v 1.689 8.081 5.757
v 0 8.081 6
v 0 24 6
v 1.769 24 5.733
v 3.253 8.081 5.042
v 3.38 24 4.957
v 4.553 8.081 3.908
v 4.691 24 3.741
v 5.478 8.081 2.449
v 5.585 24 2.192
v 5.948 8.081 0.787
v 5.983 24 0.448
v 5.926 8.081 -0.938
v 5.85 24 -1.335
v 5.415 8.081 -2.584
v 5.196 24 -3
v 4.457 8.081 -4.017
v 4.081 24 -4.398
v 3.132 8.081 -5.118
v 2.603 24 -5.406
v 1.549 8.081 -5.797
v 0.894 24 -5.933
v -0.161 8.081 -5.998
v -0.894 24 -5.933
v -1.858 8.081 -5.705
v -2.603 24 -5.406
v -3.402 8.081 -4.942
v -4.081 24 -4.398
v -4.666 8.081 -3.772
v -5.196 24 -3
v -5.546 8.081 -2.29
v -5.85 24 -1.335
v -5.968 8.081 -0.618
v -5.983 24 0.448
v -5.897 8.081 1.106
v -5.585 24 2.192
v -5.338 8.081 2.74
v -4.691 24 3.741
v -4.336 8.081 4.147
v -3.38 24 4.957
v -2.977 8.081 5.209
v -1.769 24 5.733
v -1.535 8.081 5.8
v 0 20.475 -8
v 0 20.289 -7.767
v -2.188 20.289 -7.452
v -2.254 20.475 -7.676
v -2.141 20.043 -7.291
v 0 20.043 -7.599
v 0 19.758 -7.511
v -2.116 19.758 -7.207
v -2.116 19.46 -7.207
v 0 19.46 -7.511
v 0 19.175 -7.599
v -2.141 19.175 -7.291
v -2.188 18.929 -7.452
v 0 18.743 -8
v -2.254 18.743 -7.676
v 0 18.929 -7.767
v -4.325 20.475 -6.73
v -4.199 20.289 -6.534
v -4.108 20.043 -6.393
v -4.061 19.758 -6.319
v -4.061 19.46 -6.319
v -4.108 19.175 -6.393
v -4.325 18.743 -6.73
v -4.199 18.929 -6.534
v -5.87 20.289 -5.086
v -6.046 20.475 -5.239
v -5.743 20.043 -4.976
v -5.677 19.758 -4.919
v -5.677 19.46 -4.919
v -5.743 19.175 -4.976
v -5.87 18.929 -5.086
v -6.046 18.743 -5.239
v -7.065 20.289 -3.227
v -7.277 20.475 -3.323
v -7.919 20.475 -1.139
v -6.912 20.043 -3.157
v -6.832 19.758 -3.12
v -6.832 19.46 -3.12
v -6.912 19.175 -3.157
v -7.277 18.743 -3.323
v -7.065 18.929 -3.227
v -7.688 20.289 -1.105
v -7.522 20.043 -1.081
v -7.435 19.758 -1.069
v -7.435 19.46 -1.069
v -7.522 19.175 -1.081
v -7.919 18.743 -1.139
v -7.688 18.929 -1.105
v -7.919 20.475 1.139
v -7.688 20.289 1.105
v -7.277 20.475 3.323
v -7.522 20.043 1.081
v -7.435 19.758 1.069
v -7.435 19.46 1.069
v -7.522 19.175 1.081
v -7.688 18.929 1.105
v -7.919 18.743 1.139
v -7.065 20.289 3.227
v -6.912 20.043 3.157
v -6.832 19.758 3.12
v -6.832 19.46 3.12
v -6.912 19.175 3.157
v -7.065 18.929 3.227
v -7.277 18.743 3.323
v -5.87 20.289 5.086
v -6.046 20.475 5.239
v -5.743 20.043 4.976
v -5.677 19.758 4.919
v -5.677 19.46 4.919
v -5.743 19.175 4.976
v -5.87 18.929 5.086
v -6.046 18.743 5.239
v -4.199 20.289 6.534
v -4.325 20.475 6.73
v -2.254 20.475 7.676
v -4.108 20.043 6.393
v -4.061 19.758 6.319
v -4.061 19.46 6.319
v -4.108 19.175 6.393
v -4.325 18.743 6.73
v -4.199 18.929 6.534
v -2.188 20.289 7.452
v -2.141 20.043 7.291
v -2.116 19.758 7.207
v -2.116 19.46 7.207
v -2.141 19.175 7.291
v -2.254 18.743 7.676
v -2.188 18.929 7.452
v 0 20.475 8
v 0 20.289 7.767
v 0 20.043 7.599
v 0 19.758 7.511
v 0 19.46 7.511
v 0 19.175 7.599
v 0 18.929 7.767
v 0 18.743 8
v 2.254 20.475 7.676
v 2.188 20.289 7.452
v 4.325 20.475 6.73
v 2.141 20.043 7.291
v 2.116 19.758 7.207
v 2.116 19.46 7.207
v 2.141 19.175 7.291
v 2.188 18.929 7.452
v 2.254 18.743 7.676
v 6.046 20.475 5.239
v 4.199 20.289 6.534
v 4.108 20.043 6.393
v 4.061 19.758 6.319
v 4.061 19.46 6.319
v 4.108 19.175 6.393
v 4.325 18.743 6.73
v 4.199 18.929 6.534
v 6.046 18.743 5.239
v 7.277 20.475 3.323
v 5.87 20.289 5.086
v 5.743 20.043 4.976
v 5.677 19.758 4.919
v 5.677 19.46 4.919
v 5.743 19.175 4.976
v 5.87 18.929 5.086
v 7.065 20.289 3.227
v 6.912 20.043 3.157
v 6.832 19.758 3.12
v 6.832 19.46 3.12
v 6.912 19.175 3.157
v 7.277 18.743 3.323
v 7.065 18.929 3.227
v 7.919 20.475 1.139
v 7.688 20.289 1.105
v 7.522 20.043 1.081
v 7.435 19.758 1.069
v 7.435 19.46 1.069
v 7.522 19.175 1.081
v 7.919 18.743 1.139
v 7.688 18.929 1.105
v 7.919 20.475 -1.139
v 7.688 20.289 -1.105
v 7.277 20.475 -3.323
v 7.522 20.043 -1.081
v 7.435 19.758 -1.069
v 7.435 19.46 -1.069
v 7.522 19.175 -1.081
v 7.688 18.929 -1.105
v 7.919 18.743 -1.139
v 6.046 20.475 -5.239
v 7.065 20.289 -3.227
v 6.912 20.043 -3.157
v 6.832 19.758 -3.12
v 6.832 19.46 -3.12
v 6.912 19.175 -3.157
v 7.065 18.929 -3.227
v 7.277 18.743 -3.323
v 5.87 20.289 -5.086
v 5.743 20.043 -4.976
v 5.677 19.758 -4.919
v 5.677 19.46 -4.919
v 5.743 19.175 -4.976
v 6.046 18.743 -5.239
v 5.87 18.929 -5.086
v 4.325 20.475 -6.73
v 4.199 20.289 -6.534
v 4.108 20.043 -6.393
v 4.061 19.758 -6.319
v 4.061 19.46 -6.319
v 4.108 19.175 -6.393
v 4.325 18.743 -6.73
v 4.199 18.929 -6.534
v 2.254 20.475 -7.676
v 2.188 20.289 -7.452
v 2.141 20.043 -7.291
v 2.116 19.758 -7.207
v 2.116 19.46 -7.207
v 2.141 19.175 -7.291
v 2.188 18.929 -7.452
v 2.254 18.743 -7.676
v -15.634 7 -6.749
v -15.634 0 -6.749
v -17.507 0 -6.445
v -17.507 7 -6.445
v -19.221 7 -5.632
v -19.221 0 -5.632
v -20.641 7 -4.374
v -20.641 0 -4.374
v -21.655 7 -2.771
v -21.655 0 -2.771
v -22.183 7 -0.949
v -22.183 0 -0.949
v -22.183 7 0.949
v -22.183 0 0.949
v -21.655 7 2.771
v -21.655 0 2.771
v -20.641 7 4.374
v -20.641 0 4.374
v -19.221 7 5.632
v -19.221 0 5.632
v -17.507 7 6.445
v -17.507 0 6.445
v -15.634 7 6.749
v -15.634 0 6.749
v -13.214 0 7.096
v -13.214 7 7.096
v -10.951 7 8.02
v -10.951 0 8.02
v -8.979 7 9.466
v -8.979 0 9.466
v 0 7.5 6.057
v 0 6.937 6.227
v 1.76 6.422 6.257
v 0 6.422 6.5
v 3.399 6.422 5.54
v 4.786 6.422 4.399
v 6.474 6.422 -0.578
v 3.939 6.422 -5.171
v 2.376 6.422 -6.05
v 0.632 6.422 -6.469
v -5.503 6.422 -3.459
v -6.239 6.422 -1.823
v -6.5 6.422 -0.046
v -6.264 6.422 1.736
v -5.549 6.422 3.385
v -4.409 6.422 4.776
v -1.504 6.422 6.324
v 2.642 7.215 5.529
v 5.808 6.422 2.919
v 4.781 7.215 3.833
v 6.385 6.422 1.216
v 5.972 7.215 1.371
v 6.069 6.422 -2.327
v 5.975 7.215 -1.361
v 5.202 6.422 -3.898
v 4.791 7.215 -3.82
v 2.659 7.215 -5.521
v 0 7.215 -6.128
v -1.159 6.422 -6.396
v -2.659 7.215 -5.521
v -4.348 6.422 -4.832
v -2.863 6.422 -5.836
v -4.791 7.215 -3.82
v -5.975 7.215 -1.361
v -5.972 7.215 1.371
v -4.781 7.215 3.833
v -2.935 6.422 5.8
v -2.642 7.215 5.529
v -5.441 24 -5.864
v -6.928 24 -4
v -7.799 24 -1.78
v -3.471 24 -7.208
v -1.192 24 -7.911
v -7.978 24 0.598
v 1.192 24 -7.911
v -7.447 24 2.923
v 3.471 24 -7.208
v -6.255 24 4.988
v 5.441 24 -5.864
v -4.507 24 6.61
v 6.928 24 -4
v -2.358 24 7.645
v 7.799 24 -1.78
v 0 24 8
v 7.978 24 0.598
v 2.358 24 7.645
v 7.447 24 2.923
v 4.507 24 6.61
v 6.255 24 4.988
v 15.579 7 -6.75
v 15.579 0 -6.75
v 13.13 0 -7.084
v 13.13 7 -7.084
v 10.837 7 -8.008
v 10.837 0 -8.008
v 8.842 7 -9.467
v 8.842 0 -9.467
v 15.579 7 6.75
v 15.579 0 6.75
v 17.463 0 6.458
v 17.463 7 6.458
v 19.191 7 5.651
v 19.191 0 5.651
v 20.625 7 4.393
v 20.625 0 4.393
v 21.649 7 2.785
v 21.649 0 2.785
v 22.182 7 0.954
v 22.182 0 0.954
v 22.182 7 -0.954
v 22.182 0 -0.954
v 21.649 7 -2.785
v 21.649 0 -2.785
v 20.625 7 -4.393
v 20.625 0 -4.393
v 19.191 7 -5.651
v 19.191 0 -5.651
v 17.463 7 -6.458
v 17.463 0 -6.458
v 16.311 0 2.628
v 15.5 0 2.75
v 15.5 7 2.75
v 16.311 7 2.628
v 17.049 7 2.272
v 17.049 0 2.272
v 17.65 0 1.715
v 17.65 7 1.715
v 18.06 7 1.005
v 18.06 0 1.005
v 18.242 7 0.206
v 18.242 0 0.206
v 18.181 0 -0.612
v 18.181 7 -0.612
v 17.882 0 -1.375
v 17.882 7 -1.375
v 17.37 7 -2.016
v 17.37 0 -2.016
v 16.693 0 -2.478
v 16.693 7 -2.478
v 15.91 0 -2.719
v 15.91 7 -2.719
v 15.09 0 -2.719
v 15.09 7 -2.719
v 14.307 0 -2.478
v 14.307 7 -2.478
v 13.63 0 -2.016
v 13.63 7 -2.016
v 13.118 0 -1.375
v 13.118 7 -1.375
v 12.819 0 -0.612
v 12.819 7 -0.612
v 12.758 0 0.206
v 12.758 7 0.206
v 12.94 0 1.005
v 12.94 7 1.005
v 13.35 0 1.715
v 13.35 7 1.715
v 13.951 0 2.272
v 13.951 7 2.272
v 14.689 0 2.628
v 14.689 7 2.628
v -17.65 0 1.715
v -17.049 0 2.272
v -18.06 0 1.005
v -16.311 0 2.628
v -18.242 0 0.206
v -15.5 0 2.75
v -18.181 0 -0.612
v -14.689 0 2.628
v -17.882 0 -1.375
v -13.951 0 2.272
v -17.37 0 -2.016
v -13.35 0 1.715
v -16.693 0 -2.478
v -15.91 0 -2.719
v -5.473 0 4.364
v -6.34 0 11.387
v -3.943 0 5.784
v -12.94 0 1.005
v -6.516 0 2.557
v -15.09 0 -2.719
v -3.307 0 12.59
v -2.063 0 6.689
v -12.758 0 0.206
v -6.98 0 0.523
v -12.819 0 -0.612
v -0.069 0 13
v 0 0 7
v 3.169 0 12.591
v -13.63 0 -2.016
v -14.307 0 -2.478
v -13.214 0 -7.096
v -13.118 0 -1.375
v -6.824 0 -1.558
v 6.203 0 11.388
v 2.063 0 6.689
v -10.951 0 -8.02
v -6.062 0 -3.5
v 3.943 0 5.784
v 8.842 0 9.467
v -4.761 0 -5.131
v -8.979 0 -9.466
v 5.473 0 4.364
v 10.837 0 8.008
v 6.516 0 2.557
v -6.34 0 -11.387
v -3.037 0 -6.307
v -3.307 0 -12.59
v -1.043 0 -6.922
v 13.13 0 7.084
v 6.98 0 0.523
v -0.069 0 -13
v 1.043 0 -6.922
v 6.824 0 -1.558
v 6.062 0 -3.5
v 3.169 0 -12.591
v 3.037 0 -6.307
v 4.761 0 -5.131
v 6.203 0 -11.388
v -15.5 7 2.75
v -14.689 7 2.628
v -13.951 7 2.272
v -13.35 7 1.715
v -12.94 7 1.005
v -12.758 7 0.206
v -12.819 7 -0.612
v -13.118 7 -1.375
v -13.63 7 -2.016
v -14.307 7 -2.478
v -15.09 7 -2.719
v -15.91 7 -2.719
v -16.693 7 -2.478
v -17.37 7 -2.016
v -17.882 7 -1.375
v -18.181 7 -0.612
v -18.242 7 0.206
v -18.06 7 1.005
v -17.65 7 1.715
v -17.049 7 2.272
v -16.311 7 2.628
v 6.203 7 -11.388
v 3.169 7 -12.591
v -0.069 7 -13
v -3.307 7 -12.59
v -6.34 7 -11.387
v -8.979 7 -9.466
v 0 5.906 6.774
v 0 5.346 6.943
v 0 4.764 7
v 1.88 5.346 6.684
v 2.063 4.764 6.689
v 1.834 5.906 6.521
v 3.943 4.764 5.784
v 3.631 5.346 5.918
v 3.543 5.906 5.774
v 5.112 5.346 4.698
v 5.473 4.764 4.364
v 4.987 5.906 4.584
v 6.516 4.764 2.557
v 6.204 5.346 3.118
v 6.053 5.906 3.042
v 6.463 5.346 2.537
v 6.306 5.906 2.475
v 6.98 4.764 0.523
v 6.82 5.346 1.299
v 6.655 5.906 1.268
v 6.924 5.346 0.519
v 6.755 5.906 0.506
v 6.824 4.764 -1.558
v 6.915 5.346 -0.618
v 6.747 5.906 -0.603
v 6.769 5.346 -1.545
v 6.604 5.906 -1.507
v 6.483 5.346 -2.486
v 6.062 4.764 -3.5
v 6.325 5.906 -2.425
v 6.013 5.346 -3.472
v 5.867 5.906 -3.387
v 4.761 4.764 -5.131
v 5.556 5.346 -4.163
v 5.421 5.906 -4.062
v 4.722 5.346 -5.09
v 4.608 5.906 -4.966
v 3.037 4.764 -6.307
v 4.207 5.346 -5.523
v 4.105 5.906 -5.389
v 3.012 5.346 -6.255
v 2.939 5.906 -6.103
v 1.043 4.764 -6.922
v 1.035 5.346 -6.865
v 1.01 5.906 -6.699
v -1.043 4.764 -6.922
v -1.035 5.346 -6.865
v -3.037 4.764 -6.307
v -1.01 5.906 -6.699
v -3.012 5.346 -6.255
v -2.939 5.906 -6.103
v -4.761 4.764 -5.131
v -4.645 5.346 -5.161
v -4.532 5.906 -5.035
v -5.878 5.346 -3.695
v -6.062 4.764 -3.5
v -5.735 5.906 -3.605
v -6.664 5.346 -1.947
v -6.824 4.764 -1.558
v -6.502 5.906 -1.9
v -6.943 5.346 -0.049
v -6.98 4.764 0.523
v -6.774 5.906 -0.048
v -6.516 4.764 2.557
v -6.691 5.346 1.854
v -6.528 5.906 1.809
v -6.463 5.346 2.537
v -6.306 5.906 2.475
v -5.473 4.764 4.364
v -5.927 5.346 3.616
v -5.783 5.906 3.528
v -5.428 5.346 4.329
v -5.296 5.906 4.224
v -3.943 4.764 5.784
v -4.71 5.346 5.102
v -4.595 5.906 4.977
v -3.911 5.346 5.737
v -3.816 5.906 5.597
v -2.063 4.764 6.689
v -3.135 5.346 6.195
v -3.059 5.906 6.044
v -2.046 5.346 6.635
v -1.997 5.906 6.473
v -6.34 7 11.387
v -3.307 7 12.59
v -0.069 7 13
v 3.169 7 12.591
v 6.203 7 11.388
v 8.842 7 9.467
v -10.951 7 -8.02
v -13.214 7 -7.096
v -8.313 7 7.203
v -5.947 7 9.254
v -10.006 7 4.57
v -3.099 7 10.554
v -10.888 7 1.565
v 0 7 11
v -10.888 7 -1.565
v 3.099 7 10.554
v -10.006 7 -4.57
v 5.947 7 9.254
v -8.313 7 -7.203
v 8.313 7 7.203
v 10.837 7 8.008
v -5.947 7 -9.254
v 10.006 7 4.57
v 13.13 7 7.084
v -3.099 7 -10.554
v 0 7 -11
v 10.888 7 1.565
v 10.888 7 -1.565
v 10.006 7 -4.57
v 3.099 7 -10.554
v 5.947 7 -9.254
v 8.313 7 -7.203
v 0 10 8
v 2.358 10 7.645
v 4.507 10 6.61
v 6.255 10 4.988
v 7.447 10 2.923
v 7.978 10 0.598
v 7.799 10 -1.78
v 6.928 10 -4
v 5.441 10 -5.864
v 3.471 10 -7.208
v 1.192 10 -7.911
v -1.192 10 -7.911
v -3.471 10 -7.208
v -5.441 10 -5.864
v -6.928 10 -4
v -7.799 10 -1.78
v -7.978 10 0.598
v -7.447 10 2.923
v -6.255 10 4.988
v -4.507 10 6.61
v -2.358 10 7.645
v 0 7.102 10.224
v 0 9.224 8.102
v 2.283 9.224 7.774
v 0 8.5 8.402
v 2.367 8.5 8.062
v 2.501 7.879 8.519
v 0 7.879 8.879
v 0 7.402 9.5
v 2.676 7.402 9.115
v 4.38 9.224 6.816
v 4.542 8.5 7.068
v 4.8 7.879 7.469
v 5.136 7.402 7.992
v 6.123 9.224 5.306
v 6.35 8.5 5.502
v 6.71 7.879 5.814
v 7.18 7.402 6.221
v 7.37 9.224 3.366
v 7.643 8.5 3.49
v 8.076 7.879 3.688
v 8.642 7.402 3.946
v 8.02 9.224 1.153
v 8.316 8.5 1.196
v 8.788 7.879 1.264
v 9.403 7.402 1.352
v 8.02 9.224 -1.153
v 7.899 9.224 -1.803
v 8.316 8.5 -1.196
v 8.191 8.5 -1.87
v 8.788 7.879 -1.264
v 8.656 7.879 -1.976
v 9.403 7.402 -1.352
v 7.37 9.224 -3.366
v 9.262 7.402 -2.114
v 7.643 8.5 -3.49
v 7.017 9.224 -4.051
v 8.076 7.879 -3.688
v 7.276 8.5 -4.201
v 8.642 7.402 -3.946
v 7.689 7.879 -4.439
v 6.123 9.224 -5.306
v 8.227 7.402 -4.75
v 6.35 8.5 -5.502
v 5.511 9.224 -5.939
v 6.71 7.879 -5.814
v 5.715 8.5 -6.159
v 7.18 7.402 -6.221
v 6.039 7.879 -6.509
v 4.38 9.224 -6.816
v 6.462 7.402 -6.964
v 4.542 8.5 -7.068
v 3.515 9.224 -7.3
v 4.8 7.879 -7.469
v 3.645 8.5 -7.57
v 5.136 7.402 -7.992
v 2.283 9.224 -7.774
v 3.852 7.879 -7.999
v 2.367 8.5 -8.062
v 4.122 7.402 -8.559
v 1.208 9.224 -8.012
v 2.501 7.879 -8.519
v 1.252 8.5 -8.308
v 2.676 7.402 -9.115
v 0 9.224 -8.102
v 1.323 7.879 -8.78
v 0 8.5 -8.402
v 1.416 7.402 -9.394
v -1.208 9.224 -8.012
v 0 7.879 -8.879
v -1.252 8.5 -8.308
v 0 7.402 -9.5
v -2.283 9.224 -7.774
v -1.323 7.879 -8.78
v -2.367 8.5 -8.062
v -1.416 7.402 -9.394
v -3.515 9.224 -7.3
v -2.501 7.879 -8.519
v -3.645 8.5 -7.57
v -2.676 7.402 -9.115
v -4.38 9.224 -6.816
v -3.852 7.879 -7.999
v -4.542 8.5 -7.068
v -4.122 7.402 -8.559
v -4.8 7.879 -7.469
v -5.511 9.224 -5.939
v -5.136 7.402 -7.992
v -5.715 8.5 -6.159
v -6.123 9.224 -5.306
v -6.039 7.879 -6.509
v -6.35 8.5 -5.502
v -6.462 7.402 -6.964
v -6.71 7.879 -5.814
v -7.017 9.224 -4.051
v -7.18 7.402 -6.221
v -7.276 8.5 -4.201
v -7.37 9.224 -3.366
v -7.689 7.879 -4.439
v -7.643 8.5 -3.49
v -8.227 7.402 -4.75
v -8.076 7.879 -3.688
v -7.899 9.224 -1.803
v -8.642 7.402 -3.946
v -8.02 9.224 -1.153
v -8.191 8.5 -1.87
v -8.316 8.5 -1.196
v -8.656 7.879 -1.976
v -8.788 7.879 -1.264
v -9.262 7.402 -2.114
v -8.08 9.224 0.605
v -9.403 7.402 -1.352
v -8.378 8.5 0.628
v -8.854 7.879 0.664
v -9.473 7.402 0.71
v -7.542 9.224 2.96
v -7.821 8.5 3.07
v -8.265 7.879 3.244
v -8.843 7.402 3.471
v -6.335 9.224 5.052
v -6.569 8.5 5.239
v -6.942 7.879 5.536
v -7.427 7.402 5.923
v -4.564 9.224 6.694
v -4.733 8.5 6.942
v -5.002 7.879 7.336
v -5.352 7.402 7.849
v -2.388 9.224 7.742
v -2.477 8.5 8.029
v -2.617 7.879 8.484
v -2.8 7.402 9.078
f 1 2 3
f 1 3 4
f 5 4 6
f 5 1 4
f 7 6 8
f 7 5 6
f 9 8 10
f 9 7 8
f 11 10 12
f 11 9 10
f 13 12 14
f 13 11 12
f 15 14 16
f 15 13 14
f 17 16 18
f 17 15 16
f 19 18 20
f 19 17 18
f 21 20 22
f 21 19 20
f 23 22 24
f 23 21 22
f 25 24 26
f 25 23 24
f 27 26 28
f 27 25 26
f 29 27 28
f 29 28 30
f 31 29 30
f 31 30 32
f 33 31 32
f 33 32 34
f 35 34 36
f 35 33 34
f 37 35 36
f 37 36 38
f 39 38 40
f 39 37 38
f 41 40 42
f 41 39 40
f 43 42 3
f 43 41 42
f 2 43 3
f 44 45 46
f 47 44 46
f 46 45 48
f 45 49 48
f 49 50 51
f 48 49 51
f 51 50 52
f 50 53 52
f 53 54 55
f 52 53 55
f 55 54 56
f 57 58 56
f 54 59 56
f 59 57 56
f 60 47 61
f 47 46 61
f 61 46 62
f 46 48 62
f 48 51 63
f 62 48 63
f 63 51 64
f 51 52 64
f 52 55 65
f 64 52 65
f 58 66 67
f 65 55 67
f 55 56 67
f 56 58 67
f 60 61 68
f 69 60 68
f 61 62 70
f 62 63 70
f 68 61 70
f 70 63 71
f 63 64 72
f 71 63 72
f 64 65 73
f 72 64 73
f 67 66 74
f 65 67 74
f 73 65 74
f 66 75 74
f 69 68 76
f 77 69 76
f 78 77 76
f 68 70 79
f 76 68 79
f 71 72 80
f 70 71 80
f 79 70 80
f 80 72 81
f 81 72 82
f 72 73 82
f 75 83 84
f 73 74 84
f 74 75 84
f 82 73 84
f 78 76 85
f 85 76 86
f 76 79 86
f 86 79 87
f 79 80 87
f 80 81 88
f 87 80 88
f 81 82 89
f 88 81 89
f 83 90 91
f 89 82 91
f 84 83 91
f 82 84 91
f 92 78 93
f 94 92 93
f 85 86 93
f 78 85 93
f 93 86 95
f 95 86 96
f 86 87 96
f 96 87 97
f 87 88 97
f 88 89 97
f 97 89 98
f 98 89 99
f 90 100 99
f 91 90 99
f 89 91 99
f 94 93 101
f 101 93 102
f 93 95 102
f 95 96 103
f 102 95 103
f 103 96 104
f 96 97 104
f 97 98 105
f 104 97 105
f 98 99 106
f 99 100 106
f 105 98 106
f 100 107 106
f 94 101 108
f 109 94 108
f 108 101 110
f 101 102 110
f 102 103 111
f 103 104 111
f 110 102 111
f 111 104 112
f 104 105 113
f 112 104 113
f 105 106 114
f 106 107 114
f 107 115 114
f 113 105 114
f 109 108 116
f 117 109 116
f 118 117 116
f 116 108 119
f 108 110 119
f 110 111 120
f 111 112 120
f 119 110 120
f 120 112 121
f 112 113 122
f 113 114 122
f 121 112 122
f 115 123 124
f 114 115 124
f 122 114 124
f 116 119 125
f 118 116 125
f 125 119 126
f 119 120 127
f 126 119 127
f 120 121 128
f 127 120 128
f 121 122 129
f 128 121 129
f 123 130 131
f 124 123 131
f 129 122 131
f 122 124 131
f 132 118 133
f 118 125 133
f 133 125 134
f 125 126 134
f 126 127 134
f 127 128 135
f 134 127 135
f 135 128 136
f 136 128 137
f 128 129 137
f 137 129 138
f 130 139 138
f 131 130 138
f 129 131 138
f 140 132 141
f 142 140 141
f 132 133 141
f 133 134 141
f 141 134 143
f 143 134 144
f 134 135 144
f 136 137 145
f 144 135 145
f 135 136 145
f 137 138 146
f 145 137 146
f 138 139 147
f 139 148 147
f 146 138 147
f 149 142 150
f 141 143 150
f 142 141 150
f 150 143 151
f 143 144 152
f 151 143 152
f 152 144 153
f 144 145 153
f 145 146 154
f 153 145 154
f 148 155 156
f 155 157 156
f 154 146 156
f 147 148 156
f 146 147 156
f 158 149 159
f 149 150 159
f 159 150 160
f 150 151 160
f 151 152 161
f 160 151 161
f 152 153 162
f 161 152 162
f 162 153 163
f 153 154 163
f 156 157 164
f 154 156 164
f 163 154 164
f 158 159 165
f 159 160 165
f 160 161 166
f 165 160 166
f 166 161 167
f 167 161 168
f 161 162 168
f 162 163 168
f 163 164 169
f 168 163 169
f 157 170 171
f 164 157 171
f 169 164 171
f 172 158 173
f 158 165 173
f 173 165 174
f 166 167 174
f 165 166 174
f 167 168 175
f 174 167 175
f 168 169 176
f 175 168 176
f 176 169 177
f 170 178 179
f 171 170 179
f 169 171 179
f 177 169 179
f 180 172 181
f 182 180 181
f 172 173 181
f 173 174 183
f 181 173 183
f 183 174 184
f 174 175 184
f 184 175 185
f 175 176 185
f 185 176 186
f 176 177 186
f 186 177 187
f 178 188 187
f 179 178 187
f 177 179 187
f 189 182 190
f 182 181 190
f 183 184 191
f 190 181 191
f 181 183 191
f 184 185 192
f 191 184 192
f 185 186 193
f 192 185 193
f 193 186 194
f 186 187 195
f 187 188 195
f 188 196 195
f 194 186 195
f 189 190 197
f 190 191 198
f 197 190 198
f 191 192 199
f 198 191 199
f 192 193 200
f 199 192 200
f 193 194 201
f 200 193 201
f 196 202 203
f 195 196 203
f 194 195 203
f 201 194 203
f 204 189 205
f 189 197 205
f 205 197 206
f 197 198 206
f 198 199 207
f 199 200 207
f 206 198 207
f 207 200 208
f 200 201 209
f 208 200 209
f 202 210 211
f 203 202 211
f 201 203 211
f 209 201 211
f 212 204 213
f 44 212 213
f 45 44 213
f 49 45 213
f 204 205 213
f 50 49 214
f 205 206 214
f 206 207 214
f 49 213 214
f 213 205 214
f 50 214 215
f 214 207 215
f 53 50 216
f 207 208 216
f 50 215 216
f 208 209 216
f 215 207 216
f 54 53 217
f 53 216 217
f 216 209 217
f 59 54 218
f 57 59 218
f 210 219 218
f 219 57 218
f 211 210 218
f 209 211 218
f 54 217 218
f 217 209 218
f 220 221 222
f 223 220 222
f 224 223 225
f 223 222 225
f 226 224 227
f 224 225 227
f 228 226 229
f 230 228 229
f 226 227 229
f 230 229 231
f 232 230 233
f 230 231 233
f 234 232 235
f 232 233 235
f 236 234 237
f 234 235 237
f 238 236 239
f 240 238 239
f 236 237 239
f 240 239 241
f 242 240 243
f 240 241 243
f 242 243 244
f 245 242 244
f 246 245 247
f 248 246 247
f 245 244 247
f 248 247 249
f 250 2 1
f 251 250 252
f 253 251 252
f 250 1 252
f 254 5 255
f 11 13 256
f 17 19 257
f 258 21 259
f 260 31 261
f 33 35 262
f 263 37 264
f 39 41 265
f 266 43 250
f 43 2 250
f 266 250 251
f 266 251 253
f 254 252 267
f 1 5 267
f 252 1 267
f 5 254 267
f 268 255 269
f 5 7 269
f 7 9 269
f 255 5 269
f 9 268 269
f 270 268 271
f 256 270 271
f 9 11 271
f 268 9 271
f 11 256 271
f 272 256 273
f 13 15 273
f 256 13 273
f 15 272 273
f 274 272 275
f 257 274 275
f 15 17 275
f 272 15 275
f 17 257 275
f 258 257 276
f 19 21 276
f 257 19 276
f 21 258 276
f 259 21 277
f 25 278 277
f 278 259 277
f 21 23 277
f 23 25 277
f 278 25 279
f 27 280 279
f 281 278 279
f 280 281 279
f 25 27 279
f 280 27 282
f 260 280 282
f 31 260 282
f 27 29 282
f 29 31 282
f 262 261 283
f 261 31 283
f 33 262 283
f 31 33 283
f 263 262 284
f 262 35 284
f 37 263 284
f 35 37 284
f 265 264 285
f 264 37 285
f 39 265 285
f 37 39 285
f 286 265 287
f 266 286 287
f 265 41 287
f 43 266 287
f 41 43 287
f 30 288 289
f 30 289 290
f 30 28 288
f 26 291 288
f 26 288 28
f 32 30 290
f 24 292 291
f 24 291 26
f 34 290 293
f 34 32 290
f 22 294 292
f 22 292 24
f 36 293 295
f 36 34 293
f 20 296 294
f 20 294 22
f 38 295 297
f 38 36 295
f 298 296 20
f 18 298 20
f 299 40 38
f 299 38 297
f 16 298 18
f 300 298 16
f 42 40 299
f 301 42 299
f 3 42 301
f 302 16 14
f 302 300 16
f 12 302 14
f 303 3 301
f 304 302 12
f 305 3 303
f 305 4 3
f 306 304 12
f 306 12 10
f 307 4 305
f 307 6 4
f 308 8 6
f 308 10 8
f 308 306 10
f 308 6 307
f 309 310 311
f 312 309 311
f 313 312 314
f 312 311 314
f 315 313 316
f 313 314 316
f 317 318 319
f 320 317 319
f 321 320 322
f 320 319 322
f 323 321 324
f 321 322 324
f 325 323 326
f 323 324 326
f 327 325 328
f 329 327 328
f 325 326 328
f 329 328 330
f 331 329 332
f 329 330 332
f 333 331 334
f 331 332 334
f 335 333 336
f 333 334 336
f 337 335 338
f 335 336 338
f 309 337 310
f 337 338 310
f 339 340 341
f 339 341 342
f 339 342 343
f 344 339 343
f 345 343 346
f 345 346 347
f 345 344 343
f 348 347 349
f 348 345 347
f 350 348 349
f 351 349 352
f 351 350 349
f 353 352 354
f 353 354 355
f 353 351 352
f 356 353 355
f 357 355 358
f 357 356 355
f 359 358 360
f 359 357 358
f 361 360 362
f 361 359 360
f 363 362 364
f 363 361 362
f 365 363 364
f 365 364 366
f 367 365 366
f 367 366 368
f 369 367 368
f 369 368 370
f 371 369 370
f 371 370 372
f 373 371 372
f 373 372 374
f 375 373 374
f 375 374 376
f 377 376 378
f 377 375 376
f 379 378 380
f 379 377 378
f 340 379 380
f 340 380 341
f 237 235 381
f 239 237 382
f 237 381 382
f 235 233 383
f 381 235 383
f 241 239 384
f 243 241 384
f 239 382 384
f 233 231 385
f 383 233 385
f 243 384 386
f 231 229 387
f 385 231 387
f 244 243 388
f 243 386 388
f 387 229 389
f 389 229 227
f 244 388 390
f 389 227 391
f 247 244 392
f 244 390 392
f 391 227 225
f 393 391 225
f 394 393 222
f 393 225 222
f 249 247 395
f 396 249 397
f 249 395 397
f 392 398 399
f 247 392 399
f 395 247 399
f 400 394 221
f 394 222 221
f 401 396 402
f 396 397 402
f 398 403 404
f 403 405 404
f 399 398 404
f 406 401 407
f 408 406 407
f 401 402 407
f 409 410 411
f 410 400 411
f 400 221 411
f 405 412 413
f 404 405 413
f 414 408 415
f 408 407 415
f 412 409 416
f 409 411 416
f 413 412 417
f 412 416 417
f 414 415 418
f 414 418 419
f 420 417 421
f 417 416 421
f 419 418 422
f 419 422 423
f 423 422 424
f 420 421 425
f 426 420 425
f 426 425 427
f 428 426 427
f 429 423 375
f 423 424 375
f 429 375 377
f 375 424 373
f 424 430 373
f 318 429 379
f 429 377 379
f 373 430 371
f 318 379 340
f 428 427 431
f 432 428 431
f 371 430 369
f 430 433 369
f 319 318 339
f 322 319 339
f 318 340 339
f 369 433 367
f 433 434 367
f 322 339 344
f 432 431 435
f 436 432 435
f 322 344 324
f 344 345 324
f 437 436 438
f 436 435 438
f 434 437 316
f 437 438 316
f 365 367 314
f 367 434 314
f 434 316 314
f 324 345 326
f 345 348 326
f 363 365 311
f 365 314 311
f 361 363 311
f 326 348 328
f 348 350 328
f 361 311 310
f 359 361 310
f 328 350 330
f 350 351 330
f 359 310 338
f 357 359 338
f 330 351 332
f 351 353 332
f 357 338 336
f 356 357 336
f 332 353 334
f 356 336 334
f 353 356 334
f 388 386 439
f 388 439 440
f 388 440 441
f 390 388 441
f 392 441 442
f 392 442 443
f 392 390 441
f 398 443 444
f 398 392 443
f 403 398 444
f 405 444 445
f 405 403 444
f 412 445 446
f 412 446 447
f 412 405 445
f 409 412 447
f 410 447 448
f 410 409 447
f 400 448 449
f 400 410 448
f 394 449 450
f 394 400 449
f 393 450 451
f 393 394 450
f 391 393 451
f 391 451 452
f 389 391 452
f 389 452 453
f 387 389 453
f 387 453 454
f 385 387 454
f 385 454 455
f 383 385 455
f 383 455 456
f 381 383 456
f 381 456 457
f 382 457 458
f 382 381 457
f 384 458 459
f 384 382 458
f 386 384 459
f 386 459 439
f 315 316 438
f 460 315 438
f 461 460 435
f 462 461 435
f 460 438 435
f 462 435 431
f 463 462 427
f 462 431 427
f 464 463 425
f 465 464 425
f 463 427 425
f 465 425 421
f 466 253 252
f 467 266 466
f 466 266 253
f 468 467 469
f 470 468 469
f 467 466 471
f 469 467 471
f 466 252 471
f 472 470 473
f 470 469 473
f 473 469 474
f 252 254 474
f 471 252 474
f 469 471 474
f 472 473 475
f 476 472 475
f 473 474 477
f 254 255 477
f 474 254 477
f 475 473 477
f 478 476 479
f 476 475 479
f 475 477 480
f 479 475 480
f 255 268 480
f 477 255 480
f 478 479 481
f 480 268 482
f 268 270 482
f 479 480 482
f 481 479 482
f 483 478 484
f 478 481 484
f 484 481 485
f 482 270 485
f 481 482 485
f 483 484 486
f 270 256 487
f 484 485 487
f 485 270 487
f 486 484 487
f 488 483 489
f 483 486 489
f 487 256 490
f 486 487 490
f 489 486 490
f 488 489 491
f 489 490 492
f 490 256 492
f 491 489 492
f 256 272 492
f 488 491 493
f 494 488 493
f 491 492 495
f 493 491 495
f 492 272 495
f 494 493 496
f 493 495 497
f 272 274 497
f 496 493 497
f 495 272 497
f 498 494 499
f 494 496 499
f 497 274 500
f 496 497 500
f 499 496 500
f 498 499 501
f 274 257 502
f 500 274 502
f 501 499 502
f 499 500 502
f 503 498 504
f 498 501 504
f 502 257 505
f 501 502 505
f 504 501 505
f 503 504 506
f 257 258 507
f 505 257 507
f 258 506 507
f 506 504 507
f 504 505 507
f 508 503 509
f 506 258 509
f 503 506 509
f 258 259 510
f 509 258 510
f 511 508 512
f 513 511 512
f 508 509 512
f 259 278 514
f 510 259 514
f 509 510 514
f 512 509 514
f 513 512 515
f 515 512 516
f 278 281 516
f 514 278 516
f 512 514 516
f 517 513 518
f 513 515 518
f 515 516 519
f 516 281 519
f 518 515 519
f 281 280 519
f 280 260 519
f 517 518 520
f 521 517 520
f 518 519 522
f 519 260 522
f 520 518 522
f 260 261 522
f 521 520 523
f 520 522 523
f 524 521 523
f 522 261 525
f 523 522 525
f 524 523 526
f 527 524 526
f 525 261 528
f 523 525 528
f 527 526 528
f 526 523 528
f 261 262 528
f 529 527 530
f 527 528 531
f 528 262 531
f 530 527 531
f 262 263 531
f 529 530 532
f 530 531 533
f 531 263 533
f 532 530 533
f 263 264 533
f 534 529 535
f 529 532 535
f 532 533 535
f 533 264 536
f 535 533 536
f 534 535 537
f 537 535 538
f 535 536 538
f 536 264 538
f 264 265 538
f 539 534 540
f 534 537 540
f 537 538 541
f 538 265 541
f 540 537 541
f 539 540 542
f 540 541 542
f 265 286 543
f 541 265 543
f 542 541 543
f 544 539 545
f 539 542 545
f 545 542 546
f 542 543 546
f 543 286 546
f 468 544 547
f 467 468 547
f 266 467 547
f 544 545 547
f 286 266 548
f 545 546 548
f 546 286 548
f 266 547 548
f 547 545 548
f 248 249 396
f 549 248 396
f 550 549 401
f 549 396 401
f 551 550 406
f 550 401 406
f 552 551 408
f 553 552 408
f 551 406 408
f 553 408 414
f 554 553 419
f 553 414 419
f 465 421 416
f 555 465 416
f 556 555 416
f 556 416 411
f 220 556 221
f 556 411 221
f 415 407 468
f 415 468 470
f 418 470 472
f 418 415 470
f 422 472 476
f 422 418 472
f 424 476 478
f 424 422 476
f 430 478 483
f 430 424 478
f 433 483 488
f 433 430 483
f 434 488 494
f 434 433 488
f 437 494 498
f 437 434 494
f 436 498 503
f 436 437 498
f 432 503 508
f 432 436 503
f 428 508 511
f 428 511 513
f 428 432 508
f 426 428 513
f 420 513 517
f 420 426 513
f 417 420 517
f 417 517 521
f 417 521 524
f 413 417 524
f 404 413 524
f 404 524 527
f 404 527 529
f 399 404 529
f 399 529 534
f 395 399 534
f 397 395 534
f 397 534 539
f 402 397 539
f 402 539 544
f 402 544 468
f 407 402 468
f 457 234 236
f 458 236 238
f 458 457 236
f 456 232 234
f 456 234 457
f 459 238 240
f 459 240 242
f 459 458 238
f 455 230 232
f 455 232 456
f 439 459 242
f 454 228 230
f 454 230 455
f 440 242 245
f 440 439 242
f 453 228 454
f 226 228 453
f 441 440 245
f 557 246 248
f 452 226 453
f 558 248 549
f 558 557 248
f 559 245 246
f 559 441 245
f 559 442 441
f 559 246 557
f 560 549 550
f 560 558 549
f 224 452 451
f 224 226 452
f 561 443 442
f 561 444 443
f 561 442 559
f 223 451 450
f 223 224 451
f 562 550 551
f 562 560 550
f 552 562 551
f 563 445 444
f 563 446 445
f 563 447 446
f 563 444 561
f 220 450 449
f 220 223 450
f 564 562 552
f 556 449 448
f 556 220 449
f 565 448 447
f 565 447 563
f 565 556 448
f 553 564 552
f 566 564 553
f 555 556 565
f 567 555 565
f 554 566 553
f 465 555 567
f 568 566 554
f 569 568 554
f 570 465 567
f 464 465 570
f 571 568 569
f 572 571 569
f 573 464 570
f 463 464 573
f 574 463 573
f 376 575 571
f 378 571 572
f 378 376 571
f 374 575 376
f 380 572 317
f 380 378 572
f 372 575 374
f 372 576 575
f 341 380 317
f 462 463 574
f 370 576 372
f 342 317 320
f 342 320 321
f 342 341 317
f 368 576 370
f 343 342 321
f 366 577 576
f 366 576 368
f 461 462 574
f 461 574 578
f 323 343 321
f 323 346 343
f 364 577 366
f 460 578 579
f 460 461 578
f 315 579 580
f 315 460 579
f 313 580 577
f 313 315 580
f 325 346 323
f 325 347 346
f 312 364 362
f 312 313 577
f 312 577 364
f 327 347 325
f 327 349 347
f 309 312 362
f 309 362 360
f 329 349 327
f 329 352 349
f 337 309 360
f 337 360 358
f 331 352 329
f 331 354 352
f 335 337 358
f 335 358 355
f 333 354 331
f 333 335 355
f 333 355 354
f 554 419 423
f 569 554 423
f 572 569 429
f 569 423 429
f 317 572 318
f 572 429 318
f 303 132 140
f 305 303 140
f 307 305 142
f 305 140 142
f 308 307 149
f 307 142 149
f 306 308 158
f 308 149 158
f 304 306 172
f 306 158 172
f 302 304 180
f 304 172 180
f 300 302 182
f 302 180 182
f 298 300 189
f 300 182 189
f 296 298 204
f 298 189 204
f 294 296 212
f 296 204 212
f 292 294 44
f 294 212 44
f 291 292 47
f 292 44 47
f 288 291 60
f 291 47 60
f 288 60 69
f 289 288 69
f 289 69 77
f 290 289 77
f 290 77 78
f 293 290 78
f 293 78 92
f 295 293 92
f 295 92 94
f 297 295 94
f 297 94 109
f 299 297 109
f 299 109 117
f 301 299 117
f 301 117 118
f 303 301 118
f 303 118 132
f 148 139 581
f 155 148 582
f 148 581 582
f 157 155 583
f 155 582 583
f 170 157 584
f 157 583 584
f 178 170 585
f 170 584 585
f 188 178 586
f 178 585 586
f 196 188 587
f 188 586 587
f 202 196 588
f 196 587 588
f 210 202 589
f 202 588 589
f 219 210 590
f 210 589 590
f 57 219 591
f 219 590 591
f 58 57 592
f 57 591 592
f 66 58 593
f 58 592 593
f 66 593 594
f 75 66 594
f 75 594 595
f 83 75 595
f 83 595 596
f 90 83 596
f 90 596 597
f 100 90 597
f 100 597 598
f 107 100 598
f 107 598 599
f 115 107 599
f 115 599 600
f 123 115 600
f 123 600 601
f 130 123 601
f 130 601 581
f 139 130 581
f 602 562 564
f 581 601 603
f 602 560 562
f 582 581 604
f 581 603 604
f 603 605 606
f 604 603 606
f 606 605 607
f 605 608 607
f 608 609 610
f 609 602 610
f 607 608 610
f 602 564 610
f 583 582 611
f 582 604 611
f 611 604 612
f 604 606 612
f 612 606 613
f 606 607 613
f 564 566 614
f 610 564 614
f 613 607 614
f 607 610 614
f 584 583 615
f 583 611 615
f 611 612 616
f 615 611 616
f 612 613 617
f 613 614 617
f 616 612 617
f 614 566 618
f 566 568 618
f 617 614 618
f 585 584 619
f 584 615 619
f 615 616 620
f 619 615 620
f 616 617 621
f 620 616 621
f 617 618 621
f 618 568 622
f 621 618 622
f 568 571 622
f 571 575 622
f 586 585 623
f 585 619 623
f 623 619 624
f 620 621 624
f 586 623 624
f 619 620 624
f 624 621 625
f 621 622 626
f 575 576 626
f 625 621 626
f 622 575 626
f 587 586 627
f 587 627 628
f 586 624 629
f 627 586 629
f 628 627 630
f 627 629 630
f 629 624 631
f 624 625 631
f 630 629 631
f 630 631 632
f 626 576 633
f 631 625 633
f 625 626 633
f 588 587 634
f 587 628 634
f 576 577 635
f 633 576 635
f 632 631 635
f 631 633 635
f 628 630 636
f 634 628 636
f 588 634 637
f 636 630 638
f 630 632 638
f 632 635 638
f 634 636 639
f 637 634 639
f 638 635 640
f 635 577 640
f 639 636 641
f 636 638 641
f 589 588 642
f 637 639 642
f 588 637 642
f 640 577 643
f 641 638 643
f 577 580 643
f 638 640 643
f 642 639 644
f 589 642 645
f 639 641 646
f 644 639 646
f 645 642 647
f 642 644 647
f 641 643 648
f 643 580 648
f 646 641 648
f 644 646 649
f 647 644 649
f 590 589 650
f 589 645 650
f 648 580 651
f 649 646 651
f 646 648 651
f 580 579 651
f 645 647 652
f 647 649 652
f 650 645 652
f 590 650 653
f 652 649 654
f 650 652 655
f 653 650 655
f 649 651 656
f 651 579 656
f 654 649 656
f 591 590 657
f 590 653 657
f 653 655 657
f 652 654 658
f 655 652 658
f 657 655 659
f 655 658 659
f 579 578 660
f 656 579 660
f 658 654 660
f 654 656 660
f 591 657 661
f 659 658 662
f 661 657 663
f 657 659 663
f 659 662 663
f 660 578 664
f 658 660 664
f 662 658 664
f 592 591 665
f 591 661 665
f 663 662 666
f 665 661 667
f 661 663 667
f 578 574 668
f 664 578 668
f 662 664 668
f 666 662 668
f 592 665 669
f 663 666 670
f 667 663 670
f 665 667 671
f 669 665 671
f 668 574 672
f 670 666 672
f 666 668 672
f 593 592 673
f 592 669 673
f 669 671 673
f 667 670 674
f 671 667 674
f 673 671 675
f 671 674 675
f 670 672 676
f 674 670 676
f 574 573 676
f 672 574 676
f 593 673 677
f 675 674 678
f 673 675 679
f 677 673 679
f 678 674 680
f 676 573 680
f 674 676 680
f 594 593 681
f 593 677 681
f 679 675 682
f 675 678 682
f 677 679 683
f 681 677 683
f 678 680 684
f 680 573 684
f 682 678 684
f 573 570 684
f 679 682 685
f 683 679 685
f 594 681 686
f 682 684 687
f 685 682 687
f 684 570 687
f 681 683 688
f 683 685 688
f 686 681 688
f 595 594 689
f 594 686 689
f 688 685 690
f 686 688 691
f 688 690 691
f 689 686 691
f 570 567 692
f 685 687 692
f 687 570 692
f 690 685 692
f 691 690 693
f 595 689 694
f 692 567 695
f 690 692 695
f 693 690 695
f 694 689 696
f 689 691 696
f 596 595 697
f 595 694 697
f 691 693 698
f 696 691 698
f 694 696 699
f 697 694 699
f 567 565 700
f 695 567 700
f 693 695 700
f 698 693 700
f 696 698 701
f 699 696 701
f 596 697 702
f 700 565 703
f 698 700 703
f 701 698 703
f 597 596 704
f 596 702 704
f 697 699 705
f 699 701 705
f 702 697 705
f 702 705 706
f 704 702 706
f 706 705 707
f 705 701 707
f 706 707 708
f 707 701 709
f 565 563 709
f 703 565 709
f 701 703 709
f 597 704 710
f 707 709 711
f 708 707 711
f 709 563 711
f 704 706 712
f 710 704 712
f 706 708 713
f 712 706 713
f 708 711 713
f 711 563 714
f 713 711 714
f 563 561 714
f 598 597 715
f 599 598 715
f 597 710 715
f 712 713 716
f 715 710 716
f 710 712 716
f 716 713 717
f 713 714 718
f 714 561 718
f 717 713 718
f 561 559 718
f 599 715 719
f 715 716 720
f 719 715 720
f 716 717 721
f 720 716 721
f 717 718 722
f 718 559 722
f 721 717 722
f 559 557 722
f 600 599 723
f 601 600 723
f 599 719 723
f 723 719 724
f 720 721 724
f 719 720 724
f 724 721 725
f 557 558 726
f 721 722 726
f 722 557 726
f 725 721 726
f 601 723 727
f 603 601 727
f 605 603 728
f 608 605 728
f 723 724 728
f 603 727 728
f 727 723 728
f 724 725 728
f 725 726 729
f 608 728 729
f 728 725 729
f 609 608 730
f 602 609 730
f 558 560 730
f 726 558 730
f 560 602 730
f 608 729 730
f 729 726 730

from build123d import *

# Parameters (mm, degrees)
SKETCH1_R           = 7
SKETCH1_R_2         = 2.75
BOSS_EXTRUDE1_DEPTH = 7
SKETCH2_R           = 8
SKETCH2_R_2         = 6
BOSS_EXTRUDE2_DEPTH = 17
FILLET1_R           = 3
FILLET2_R           = 3
SKETCH3_R           = 1


with BuildPart() as part:
    # Sketch1 → Boss-Extrude1 (new body)
    with BuildSketch(Plane(origin=(0, 0, 0), x_dir=(1, 0, 0), z_dir=(0, 1, 0))):
        with BuildLine():
            ThreePointArc((-15.634333704, 6.748663161), (-22.25, 0), (-15.634333704, -6.748663161))
            ThreePointArc((-15.634333704, -6.748663161), (-12.054001616, -7.488359295), (-8.978814065, -9.465516285))
            ThreePointArc((-8.978814065, -9.465516285), (-0.068820662, -12.999999969), (8.841661443, -9.466748488))
            ThreePointArc((8.841661443, -9.466748488), (11.954703039, -7.474770851), (15.578657445, -6.749541689))
            ThreePointArc((15.578657445, -6.749541689), (22.25, 0), (15.578657445, 6.749541689))
            ThreePointArc((15.578657445, 6.749541689), (11.954703039, 7.474770851), (8.841661443, 9.466748488))
            ThreePointArc((8.841661443, 9.466748488), (-0.068820662, 12.999999969), (-8.978814065, 9.465516285))
            ThreePointArc((-8.978814065, 9.465516285), (-12.054001616, 7.488359295), (-15.634333704, 6.748663161))
        make_face()
        with Locations(Location((0, 0, 0), (0, 0, 270))):
            Circle(SKETCH1_R, mode=Mode.SUBTRACT)
        with Locations(Location((-15.5, 0, 0), (0, 0, 270))):
            Circle(SKETCH1_R_2, mode=Mode.SUBTRACT)
        with Locations(Location((15.5, 0, 0), (0, 0, 270))):
            Circle(SKETCH1_R_2, mode=Mode.SUBTRACT)
    extrude(amount=BOSS_EXTRUDE1_DEPTH)

    # Sketch2 → Boss-Extrude2 (add)
    with BuildSketch(Plane(origin=(0, 7, 0), x_dir=(1, 0, 0), z_dir=(0, 1, 0))):
        with Locations(Location((0, 0, 0), (0, 0, 270))):
            Circle(SKETCH2_R)
        with Locations(Location((0, 0, 0), (0, 0, 270))):
            Circle(SKETCH2_R_2, mode=Mode.SUBTRACT)
    extrude(amount=BOSS_EXTRUDE2_DEPTH)

    # Fillet1
    # the kernel refuses this fillet: 3 mm, written as the material it adds along each edge
    with BuildSketch(Plane(origin=(0, 7, 0), x_dir=(0, 0, 1), z_dir=(-1, 0, 0))) as fillet1_piece_1:
        with BuildLine():
            CenterArc((4, -2.236067977), FILLET1_R, 0, 48.189685104)
            Line((6, 0), (6.04, 0.04472136))
            ThreePointArc((6.04, 0.04472136), (6.5, 0.06), (7, 0.06))
            Line((7, 0.06), (7.06, 0))
            Line((7.06, 0), (7.06, -2.236067977))
            Line((7.06, -2.236067977), (7, -2.236067977))
        make_face()
    revolve(axis=Axis((0, 7, 0), (0, 1, 0)))
    with BuildSketch(Plane(origin=(0, 7, 0), x_dir=(0, 0, 1), z_dir=(-1, 0, 0))) as fillet1_piece_2:
        with BuildLine():
            CenterArc((8 + FILLET1_R, FILLET1_R), FILLET1_R, 180, 90)
            Line((8, FILLET1_R), (8 - FILLET1_R * 0.02, FILLET1_R))
            Line((8 - FILLET1_R * 0.02, FILLET1_R), (8 - FILLET1_R * 0.02, -FILLET1_R * 0.02))
            Line((8 - FILLET1_R * 0.02, -FILLET1_R * 0.02), (8 + FILLET1_R, -FILLET1_R * 0.02))
            Line((8 + FILLET1_R, -FILLET1_R * 0.02), (8 + FILLET1_R, 0))
        make_face()
    revolve(axis=Axis((0, 7, 0), (0, 1, 0)))

    # Fillet2
    fillet2_edges = [part.edges().sort_by_distance(p)[0] for p in [
        (0, 7, -6),
    ]]
    fillet(fillet2_edges, radius=FILLET2_R)


with BuildPart() as body_2:
    # Sketch3 → Revolve1 (revolve)
    with BuildSketch(Plane(origin=(0, 0, 0), x_dir=(0, 0, -1), z_dir=(1, 0, 0))):
        with Locations((8.5, 19.608844607)):
            Circle(SKETCH3_R)
    revolve(axis=Axis((0, 0, 0), (0, 1, 0)))


with BuildPart() as part_1:
    add(part.part)

    # Intersect1: read off the stored shape, not the designer's step
    # Intersect1: cut body 2
    add(body_2.part, mode=Mode.SUBTRACT)


solid = part_1.part
